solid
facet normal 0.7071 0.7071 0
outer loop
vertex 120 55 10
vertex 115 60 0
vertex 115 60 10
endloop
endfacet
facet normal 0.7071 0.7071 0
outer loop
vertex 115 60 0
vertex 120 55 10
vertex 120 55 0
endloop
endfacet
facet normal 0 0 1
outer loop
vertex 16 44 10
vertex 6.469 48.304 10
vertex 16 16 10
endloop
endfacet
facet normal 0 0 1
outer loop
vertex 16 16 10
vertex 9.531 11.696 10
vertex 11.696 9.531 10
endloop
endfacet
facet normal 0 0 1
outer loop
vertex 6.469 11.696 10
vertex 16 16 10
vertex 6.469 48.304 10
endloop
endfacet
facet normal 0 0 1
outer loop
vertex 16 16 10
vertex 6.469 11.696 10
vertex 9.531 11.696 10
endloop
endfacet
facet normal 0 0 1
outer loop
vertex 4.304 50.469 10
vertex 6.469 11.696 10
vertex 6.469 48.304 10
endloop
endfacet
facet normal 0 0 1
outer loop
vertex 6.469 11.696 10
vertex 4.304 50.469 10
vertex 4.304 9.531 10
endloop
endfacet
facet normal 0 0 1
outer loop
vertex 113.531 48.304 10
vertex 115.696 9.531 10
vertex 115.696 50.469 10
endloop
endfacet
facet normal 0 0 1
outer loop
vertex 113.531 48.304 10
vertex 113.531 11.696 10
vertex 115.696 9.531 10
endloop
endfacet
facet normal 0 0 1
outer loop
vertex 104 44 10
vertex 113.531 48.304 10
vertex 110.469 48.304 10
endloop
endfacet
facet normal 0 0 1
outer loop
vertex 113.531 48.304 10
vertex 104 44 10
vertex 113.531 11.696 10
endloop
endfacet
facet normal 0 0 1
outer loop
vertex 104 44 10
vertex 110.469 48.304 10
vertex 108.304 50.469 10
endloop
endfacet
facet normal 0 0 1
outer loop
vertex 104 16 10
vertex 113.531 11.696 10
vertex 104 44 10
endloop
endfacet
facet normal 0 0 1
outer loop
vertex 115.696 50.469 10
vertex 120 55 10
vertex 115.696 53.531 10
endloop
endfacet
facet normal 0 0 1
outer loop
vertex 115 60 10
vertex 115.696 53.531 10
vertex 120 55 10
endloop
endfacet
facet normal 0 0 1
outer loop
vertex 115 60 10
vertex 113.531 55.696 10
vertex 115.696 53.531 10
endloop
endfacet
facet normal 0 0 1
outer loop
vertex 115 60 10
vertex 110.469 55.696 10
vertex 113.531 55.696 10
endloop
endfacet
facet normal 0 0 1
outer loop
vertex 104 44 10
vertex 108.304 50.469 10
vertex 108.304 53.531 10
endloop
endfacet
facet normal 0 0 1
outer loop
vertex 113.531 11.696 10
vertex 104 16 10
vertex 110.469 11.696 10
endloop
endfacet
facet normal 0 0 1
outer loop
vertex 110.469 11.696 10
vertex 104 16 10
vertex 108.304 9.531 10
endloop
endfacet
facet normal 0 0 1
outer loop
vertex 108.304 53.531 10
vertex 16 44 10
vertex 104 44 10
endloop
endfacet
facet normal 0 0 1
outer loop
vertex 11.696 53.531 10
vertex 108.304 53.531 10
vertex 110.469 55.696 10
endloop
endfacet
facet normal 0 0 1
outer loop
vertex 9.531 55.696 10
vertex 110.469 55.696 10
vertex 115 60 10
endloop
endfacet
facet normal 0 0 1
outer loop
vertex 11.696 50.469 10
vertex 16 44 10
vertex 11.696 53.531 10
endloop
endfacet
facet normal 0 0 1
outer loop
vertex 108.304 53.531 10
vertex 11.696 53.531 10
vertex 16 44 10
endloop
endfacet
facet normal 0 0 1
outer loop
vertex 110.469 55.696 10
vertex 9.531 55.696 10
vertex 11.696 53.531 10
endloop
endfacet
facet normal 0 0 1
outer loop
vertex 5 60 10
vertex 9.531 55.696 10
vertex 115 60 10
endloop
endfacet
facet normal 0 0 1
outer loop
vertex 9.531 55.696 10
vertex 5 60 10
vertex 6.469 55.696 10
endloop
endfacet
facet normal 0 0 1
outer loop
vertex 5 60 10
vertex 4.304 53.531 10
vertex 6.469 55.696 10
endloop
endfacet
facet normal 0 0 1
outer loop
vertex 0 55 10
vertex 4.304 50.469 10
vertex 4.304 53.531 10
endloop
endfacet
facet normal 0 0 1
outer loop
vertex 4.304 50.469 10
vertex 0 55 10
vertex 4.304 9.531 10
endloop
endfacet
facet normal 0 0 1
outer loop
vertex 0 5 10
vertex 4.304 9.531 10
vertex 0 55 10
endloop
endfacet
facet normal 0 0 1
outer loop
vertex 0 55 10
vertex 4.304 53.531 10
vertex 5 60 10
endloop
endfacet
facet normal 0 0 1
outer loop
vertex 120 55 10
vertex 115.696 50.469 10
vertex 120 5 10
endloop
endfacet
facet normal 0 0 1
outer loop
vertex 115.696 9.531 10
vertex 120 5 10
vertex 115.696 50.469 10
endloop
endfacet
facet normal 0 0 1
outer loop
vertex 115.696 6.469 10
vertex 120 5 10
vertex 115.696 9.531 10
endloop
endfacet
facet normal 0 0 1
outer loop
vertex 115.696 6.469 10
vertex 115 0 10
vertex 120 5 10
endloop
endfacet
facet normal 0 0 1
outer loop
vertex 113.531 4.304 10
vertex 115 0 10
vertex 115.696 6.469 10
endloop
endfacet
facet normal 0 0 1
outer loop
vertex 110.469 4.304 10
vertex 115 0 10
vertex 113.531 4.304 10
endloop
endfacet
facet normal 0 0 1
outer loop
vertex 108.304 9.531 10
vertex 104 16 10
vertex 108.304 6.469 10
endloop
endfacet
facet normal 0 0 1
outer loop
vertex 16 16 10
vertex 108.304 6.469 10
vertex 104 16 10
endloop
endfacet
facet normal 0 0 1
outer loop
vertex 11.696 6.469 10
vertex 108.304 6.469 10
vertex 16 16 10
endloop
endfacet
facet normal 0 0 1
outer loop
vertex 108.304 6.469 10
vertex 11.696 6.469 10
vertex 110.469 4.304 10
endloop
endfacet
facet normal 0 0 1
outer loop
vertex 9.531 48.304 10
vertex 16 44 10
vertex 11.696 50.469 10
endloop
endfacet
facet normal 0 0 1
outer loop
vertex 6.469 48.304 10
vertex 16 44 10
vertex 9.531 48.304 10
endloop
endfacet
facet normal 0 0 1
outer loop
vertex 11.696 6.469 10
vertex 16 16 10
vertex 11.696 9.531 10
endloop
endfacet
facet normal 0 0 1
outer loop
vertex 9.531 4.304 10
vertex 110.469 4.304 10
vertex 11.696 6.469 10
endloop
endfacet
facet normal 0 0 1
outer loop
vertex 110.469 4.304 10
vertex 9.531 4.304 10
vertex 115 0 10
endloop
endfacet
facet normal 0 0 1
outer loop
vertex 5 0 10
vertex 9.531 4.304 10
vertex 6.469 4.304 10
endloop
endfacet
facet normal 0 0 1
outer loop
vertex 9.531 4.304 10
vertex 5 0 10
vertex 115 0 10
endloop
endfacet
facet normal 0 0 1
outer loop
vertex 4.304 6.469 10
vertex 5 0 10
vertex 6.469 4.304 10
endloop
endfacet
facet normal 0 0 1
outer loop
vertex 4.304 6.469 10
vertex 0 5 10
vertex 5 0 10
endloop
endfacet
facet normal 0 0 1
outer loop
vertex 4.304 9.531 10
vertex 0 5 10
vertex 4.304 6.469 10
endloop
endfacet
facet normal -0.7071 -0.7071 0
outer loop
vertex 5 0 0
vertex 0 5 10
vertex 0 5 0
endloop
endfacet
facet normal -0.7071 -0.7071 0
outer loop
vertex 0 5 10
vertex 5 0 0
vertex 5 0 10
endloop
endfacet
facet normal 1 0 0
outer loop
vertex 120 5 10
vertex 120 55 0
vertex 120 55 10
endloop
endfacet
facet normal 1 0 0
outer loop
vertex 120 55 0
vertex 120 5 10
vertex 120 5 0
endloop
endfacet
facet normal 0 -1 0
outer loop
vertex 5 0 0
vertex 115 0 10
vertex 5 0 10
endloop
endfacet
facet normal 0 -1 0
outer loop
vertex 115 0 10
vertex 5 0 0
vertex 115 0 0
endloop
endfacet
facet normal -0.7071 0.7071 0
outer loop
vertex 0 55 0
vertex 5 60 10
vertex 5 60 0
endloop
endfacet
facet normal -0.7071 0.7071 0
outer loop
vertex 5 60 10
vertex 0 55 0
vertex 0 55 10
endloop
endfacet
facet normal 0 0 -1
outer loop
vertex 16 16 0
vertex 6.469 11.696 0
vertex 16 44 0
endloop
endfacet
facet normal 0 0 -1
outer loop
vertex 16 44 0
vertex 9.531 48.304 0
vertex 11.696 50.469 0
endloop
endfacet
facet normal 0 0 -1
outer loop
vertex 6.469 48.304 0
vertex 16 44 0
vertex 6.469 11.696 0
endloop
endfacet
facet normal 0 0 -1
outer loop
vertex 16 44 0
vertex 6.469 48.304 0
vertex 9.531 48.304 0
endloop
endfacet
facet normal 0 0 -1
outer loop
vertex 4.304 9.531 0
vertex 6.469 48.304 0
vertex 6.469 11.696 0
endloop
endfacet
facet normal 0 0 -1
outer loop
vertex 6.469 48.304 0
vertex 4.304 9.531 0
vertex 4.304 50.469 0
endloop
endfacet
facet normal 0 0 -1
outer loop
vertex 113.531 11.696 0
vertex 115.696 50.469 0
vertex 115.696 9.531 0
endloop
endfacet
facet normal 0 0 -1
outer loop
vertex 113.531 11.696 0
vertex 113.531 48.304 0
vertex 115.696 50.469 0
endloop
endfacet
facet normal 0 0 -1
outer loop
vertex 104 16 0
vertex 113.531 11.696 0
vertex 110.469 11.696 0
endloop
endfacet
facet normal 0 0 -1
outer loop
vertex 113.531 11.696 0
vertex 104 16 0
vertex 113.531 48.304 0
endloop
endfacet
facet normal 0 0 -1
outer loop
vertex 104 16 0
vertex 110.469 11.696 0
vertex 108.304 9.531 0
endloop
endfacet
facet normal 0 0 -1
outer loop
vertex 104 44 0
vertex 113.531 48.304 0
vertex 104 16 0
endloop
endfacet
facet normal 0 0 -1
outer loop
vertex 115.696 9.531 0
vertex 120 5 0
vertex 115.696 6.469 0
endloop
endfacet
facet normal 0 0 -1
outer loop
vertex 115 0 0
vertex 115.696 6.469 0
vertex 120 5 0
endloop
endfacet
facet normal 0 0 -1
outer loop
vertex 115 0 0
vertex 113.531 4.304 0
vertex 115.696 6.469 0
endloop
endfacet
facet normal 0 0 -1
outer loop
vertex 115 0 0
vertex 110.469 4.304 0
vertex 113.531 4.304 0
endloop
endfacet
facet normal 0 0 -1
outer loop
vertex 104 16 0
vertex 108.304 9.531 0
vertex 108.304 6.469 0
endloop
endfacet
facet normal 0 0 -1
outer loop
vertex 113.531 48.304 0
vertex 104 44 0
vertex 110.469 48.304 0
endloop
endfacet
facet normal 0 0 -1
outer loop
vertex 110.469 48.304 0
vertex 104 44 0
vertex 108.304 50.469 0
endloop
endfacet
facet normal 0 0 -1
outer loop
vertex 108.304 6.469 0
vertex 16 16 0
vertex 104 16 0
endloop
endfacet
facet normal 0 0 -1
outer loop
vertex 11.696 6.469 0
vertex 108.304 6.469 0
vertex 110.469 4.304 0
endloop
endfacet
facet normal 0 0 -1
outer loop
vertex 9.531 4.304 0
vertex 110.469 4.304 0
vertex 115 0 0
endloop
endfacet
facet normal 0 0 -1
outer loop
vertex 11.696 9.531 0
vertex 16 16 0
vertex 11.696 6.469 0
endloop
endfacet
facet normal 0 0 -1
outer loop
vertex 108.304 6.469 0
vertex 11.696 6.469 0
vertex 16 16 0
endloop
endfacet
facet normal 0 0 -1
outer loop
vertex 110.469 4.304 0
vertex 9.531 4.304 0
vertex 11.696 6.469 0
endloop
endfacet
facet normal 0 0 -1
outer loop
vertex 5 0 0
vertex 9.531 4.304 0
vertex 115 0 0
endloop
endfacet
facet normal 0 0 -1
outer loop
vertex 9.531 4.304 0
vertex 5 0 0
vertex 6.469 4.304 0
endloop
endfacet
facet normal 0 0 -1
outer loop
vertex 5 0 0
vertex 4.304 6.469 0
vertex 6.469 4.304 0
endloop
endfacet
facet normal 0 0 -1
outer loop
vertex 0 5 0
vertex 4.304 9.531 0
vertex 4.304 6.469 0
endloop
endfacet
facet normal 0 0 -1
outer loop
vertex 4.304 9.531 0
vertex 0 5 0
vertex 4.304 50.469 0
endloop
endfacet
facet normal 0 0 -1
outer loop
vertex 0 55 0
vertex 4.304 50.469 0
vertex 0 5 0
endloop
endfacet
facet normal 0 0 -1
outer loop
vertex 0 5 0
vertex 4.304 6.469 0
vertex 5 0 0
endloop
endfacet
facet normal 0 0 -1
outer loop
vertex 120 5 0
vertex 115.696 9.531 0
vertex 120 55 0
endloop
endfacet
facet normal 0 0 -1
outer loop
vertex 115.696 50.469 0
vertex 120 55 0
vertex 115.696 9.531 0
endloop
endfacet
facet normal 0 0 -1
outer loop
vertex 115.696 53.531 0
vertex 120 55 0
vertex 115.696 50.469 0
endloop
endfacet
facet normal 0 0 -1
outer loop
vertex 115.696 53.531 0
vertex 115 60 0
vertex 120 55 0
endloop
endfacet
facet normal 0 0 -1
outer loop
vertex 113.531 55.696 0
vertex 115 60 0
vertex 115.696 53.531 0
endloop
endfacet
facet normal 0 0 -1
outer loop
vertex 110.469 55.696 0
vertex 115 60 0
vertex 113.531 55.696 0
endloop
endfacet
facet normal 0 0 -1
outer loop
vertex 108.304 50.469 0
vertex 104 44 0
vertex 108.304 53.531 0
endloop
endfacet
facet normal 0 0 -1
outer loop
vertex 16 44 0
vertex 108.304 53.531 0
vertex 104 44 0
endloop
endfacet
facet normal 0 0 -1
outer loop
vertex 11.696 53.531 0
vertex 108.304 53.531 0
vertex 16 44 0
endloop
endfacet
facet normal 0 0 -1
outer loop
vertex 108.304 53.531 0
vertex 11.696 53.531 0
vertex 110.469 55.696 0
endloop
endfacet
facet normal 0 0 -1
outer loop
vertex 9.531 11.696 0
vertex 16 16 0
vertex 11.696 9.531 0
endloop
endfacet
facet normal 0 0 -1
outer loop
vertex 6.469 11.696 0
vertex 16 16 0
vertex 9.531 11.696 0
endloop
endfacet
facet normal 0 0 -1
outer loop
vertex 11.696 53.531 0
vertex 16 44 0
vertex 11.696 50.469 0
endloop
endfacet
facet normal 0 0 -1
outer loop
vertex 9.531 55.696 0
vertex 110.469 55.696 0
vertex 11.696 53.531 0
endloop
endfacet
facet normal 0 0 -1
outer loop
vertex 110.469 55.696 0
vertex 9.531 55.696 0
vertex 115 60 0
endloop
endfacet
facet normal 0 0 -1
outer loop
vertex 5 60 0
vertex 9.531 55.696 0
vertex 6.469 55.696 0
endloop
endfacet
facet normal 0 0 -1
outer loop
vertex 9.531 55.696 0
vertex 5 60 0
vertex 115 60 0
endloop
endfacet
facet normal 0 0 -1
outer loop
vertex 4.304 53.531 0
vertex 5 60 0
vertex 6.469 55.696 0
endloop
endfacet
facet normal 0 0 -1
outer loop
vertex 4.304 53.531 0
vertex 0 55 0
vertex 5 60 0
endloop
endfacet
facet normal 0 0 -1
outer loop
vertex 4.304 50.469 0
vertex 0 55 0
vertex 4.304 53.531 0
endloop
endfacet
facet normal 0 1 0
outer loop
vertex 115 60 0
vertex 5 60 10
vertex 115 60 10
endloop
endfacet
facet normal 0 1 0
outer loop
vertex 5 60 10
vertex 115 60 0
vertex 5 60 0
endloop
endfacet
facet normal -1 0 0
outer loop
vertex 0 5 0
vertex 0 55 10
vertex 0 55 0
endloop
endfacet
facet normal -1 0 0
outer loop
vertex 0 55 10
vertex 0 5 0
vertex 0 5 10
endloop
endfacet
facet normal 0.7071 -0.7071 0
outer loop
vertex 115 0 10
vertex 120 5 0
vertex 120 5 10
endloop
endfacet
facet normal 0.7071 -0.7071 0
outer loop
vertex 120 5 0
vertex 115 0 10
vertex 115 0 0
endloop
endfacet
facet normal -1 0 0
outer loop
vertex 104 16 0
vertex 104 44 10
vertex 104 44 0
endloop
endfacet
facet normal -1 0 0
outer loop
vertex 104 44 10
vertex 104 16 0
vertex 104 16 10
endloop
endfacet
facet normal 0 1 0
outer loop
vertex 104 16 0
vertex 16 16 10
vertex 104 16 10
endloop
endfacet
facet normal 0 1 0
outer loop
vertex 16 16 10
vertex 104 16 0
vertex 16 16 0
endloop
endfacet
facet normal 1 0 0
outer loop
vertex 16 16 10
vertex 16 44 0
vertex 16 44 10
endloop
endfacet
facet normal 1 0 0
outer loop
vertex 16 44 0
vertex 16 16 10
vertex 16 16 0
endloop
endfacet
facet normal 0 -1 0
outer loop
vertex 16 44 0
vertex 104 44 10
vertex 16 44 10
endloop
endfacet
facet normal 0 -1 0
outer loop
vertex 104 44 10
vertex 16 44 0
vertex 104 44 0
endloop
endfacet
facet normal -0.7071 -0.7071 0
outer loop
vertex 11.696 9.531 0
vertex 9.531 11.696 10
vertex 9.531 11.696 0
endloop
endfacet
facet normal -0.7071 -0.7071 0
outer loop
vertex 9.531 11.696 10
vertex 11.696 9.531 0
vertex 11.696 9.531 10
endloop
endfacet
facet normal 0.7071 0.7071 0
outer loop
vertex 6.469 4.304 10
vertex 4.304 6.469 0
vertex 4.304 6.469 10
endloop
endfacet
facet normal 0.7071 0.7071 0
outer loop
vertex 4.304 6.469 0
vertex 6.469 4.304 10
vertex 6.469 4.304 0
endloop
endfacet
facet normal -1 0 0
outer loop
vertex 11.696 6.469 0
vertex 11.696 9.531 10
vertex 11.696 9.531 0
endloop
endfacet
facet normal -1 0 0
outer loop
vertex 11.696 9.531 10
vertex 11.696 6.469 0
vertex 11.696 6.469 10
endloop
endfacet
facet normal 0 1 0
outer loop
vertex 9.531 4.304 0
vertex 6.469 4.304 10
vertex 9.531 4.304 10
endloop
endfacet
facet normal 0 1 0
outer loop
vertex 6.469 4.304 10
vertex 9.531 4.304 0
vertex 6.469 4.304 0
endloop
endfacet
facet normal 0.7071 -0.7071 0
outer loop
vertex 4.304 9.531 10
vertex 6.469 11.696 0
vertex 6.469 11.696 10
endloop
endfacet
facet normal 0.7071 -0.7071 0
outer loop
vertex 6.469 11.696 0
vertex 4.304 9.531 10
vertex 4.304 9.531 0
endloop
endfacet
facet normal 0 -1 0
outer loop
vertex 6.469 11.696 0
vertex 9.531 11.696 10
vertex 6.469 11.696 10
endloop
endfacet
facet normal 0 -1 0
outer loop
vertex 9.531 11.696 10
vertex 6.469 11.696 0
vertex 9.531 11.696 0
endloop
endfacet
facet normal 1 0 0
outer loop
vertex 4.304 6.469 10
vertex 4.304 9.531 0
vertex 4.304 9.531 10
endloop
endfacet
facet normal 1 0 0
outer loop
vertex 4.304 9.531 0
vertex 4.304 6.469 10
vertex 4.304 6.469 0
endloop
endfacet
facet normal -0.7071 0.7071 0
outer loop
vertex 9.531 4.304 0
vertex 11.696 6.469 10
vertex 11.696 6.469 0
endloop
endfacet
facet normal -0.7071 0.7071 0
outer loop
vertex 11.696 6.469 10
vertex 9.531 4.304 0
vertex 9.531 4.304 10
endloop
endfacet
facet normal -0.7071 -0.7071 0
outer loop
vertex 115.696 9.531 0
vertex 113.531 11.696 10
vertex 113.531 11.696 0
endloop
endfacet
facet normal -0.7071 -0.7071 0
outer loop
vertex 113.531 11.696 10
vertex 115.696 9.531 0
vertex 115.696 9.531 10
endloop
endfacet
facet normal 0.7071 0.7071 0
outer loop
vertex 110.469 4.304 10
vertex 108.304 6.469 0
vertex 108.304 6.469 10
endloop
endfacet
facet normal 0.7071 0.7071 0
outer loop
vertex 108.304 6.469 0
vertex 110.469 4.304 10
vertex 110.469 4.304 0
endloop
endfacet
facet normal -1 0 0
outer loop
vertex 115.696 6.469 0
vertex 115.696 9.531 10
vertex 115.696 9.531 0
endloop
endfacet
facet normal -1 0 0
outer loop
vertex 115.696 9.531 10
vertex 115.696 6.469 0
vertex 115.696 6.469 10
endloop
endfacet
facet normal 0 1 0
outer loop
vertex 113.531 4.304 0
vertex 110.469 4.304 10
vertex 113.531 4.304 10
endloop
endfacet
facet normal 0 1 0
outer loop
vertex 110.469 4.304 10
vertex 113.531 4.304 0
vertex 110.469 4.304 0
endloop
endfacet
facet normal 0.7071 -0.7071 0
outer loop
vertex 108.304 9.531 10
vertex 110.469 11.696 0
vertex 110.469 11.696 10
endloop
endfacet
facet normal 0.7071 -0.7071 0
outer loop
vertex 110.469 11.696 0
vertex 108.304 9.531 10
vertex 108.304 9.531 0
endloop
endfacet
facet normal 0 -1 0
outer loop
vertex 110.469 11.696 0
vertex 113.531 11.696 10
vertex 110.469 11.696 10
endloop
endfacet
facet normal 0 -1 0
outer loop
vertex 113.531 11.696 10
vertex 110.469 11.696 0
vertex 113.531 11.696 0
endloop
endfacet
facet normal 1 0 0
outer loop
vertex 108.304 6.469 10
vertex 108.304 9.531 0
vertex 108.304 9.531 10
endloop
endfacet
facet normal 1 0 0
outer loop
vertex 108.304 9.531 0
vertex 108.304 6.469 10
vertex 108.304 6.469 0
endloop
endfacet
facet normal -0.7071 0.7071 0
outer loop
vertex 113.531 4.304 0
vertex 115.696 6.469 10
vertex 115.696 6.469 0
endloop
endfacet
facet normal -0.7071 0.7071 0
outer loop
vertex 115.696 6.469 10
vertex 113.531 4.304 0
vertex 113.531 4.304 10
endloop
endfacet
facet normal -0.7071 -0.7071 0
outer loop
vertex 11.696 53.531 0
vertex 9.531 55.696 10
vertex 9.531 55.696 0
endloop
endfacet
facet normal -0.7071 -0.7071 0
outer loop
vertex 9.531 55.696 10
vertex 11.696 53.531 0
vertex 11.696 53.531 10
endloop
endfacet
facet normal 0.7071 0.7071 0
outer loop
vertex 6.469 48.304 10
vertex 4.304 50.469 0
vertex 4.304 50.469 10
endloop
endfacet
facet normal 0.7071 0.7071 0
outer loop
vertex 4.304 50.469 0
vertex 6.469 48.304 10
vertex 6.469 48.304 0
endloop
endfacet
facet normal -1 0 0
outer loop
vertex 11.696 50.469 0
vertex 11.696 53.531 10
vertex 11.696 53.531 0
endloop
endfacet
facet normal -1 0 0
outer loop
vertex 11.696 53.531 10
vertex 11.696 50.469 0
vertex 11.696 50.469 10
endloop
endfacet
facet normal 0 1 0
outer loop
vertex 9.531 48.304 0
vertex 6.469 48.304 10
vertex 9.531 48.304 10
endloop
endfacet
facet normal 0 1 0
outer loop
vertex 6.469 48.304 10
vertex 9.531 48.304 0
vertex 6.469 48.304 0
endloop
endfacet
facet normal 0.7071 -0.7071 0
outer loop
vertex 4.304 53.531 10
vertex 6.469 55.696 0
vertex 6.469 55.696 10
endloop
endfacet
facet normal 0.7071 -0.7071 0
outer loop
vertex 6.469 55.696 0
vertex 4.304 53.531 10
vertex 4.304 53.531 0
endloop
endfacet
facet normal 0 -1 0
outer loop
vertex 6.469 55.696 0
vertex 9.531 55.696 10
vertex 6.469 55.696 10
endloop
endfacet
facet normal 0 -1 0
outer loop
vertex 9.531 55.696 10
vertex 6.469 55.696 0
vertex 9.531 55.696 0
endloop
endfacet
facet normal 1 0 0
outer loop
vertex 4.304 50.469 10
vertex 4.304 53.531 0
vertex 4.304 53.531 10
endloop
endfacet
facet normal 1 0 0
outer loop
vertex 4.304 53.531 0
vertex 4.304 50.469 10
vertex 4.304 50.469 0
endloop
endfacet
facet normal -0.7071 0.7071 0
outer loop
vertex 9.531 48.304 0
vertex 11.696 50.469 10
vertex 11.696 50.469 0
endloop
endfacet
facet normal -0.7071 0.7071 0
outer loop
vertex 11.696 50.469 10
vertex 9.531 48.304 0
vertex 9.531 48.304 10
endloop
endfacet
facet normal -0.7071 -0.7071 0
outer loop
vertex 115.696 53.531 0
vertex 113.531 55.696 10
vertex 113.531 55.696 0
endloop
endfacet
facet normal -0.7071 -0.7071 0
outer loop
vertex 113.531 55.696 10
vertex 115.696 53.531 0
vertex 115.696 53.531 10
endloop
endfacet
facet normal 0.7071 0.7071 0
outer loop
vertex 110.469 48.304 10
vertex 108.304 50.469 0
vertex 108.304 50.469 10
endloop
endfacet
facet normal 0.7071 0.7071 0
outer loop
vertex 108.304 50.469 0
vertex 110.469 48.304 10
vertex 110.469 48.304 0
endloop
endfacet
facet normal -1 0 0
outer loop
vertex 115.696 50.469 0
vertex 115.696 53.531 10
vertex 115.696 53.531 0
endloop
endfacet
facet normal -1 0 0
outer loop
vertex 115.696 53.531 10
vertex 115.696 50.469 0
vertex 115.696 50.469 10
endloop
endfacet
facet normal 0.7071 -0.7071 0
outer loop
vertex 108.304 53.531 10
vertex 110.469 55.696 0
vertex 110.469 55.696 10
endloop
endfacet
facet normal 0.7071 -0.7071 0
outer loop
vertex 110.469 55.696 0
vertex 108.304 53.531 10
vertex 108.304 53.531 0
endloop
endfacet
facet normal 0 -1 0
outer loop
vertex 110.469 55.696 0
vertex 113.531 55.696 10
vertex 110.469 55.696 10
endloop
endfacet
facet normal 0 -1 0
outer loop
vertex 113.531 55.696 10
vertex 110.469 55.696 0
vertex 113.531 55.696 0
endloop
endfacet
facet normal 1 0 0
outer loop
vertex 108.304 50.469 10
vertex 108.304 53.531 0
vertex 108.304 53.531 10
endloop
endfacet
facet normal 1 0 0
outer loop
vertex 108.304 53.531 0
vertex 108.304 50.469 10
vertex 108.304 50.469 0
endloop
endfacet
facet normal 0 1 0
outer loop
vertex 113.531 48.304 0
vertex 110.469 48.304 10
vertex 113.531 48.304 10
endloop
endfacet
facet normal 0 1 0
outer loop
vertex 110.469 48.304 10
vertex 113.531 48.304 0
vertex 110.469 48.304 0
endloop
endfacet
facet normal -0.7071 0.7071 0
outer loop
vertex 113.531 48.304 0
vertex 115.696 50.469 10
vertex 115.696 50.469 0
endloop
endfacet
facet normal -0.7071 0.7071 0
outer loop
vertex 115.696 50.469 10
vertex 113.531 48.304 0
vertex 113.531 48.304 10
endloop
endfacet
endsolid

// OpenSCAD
$fn = 32;

// ----------------------------------------------------------------------
// Frame plate: 120 x 60 frame, 16 mm rails
// ----------------------------------------------------------------------

// --- parameters (mm) ---
plate_l = 120;            // plate length, X
plate_w = 60;             // plate width, Y
plate_t = 10;             // plate thickness, Z (extrusion height)
corner_c = 5;             // corner chamfer
frame_bar = 16;           // frame rail width
bolt_r = 4;               // corner bolt window radius
bolt_inset = 8;           // bolt centre inset from the edges
fit_tol = 0.1;            // declared fit tolerance (prompt contract)
free_tol = 0.3;           // declared free tolerance (prompt contract)

win_l = plate_l - 2 * frame_bar;  // window length
win_w = plate_w - 2 * frame_bar;  // window width
bolt_d = 2 * bolt_r;  // corner hole diameter

profile = [[5, 0], [115, 0], [120, 5], [120, 55], [115, 60], [5, 60], [0, 55], [0, 5]];  // primary outline, 8 points, counter clockwise
void_1 = [[16, 16], [104, 16], [104, 44], [16, 44]];  // the window, 4 points
void_2 = [[11.696, 9.531], [9.531, 11.696], [6.469, 11.696], [4.304, 9.531], [4.304, 6.469], [6.469, 4.304], [9.531, 4.304], [11.696, 6.469]];  // corner bolt window, 8 points
void_3 = [[115.696, 9.531], [113.531, 11.696], [110.469, 11.696], [108.304, 9.531], [108.304, 6.469], [110.469, 4.304], [113.531, 4.304], [115.696, 6.469]];  // corner bolt window, 8 points
void_4 = [[11.696, 53.531], [9.531, 55.696], [6.469, 55.696], [4.304, 53.531], [4.304, 50.469], [6.469, 48.304], [9.531, 48.304], [11.696, 50.469]];  // corner bolt window, 8 points
void_5 = [[115.696, 53.531], [113.531, 55.696], [110.469, 55.696], [108.304, 53.531], [108.304, 50.469], [110.469, 48.304], [113.531, 48.304], [115.696, 50.469]];  // corner bolt window, 8 points

// --- the one profile operation ---
difference() {
  linear_extrude(height = plate_t) polygon(points = profile);
  translate([0, 0, -1])
    linear_extrude(height = plate_t + 2) polygon(points = void_1);
  translate([0, 0, -1])
    linear_extrude(height = plate_t + 2) polygon(points = void_2);
  translate([0, 0, -1])
    linear_extrude(height = plate_t + 2) polygon(points = void_3);
  translate([0, 0, -1])
    linear_extrude(height = plate_t + 2) polygon(points = void_4);
  translate([0, 0, -1])
    linear_extrude(height = plate_t + 2) polygon(points = void_5);
}
